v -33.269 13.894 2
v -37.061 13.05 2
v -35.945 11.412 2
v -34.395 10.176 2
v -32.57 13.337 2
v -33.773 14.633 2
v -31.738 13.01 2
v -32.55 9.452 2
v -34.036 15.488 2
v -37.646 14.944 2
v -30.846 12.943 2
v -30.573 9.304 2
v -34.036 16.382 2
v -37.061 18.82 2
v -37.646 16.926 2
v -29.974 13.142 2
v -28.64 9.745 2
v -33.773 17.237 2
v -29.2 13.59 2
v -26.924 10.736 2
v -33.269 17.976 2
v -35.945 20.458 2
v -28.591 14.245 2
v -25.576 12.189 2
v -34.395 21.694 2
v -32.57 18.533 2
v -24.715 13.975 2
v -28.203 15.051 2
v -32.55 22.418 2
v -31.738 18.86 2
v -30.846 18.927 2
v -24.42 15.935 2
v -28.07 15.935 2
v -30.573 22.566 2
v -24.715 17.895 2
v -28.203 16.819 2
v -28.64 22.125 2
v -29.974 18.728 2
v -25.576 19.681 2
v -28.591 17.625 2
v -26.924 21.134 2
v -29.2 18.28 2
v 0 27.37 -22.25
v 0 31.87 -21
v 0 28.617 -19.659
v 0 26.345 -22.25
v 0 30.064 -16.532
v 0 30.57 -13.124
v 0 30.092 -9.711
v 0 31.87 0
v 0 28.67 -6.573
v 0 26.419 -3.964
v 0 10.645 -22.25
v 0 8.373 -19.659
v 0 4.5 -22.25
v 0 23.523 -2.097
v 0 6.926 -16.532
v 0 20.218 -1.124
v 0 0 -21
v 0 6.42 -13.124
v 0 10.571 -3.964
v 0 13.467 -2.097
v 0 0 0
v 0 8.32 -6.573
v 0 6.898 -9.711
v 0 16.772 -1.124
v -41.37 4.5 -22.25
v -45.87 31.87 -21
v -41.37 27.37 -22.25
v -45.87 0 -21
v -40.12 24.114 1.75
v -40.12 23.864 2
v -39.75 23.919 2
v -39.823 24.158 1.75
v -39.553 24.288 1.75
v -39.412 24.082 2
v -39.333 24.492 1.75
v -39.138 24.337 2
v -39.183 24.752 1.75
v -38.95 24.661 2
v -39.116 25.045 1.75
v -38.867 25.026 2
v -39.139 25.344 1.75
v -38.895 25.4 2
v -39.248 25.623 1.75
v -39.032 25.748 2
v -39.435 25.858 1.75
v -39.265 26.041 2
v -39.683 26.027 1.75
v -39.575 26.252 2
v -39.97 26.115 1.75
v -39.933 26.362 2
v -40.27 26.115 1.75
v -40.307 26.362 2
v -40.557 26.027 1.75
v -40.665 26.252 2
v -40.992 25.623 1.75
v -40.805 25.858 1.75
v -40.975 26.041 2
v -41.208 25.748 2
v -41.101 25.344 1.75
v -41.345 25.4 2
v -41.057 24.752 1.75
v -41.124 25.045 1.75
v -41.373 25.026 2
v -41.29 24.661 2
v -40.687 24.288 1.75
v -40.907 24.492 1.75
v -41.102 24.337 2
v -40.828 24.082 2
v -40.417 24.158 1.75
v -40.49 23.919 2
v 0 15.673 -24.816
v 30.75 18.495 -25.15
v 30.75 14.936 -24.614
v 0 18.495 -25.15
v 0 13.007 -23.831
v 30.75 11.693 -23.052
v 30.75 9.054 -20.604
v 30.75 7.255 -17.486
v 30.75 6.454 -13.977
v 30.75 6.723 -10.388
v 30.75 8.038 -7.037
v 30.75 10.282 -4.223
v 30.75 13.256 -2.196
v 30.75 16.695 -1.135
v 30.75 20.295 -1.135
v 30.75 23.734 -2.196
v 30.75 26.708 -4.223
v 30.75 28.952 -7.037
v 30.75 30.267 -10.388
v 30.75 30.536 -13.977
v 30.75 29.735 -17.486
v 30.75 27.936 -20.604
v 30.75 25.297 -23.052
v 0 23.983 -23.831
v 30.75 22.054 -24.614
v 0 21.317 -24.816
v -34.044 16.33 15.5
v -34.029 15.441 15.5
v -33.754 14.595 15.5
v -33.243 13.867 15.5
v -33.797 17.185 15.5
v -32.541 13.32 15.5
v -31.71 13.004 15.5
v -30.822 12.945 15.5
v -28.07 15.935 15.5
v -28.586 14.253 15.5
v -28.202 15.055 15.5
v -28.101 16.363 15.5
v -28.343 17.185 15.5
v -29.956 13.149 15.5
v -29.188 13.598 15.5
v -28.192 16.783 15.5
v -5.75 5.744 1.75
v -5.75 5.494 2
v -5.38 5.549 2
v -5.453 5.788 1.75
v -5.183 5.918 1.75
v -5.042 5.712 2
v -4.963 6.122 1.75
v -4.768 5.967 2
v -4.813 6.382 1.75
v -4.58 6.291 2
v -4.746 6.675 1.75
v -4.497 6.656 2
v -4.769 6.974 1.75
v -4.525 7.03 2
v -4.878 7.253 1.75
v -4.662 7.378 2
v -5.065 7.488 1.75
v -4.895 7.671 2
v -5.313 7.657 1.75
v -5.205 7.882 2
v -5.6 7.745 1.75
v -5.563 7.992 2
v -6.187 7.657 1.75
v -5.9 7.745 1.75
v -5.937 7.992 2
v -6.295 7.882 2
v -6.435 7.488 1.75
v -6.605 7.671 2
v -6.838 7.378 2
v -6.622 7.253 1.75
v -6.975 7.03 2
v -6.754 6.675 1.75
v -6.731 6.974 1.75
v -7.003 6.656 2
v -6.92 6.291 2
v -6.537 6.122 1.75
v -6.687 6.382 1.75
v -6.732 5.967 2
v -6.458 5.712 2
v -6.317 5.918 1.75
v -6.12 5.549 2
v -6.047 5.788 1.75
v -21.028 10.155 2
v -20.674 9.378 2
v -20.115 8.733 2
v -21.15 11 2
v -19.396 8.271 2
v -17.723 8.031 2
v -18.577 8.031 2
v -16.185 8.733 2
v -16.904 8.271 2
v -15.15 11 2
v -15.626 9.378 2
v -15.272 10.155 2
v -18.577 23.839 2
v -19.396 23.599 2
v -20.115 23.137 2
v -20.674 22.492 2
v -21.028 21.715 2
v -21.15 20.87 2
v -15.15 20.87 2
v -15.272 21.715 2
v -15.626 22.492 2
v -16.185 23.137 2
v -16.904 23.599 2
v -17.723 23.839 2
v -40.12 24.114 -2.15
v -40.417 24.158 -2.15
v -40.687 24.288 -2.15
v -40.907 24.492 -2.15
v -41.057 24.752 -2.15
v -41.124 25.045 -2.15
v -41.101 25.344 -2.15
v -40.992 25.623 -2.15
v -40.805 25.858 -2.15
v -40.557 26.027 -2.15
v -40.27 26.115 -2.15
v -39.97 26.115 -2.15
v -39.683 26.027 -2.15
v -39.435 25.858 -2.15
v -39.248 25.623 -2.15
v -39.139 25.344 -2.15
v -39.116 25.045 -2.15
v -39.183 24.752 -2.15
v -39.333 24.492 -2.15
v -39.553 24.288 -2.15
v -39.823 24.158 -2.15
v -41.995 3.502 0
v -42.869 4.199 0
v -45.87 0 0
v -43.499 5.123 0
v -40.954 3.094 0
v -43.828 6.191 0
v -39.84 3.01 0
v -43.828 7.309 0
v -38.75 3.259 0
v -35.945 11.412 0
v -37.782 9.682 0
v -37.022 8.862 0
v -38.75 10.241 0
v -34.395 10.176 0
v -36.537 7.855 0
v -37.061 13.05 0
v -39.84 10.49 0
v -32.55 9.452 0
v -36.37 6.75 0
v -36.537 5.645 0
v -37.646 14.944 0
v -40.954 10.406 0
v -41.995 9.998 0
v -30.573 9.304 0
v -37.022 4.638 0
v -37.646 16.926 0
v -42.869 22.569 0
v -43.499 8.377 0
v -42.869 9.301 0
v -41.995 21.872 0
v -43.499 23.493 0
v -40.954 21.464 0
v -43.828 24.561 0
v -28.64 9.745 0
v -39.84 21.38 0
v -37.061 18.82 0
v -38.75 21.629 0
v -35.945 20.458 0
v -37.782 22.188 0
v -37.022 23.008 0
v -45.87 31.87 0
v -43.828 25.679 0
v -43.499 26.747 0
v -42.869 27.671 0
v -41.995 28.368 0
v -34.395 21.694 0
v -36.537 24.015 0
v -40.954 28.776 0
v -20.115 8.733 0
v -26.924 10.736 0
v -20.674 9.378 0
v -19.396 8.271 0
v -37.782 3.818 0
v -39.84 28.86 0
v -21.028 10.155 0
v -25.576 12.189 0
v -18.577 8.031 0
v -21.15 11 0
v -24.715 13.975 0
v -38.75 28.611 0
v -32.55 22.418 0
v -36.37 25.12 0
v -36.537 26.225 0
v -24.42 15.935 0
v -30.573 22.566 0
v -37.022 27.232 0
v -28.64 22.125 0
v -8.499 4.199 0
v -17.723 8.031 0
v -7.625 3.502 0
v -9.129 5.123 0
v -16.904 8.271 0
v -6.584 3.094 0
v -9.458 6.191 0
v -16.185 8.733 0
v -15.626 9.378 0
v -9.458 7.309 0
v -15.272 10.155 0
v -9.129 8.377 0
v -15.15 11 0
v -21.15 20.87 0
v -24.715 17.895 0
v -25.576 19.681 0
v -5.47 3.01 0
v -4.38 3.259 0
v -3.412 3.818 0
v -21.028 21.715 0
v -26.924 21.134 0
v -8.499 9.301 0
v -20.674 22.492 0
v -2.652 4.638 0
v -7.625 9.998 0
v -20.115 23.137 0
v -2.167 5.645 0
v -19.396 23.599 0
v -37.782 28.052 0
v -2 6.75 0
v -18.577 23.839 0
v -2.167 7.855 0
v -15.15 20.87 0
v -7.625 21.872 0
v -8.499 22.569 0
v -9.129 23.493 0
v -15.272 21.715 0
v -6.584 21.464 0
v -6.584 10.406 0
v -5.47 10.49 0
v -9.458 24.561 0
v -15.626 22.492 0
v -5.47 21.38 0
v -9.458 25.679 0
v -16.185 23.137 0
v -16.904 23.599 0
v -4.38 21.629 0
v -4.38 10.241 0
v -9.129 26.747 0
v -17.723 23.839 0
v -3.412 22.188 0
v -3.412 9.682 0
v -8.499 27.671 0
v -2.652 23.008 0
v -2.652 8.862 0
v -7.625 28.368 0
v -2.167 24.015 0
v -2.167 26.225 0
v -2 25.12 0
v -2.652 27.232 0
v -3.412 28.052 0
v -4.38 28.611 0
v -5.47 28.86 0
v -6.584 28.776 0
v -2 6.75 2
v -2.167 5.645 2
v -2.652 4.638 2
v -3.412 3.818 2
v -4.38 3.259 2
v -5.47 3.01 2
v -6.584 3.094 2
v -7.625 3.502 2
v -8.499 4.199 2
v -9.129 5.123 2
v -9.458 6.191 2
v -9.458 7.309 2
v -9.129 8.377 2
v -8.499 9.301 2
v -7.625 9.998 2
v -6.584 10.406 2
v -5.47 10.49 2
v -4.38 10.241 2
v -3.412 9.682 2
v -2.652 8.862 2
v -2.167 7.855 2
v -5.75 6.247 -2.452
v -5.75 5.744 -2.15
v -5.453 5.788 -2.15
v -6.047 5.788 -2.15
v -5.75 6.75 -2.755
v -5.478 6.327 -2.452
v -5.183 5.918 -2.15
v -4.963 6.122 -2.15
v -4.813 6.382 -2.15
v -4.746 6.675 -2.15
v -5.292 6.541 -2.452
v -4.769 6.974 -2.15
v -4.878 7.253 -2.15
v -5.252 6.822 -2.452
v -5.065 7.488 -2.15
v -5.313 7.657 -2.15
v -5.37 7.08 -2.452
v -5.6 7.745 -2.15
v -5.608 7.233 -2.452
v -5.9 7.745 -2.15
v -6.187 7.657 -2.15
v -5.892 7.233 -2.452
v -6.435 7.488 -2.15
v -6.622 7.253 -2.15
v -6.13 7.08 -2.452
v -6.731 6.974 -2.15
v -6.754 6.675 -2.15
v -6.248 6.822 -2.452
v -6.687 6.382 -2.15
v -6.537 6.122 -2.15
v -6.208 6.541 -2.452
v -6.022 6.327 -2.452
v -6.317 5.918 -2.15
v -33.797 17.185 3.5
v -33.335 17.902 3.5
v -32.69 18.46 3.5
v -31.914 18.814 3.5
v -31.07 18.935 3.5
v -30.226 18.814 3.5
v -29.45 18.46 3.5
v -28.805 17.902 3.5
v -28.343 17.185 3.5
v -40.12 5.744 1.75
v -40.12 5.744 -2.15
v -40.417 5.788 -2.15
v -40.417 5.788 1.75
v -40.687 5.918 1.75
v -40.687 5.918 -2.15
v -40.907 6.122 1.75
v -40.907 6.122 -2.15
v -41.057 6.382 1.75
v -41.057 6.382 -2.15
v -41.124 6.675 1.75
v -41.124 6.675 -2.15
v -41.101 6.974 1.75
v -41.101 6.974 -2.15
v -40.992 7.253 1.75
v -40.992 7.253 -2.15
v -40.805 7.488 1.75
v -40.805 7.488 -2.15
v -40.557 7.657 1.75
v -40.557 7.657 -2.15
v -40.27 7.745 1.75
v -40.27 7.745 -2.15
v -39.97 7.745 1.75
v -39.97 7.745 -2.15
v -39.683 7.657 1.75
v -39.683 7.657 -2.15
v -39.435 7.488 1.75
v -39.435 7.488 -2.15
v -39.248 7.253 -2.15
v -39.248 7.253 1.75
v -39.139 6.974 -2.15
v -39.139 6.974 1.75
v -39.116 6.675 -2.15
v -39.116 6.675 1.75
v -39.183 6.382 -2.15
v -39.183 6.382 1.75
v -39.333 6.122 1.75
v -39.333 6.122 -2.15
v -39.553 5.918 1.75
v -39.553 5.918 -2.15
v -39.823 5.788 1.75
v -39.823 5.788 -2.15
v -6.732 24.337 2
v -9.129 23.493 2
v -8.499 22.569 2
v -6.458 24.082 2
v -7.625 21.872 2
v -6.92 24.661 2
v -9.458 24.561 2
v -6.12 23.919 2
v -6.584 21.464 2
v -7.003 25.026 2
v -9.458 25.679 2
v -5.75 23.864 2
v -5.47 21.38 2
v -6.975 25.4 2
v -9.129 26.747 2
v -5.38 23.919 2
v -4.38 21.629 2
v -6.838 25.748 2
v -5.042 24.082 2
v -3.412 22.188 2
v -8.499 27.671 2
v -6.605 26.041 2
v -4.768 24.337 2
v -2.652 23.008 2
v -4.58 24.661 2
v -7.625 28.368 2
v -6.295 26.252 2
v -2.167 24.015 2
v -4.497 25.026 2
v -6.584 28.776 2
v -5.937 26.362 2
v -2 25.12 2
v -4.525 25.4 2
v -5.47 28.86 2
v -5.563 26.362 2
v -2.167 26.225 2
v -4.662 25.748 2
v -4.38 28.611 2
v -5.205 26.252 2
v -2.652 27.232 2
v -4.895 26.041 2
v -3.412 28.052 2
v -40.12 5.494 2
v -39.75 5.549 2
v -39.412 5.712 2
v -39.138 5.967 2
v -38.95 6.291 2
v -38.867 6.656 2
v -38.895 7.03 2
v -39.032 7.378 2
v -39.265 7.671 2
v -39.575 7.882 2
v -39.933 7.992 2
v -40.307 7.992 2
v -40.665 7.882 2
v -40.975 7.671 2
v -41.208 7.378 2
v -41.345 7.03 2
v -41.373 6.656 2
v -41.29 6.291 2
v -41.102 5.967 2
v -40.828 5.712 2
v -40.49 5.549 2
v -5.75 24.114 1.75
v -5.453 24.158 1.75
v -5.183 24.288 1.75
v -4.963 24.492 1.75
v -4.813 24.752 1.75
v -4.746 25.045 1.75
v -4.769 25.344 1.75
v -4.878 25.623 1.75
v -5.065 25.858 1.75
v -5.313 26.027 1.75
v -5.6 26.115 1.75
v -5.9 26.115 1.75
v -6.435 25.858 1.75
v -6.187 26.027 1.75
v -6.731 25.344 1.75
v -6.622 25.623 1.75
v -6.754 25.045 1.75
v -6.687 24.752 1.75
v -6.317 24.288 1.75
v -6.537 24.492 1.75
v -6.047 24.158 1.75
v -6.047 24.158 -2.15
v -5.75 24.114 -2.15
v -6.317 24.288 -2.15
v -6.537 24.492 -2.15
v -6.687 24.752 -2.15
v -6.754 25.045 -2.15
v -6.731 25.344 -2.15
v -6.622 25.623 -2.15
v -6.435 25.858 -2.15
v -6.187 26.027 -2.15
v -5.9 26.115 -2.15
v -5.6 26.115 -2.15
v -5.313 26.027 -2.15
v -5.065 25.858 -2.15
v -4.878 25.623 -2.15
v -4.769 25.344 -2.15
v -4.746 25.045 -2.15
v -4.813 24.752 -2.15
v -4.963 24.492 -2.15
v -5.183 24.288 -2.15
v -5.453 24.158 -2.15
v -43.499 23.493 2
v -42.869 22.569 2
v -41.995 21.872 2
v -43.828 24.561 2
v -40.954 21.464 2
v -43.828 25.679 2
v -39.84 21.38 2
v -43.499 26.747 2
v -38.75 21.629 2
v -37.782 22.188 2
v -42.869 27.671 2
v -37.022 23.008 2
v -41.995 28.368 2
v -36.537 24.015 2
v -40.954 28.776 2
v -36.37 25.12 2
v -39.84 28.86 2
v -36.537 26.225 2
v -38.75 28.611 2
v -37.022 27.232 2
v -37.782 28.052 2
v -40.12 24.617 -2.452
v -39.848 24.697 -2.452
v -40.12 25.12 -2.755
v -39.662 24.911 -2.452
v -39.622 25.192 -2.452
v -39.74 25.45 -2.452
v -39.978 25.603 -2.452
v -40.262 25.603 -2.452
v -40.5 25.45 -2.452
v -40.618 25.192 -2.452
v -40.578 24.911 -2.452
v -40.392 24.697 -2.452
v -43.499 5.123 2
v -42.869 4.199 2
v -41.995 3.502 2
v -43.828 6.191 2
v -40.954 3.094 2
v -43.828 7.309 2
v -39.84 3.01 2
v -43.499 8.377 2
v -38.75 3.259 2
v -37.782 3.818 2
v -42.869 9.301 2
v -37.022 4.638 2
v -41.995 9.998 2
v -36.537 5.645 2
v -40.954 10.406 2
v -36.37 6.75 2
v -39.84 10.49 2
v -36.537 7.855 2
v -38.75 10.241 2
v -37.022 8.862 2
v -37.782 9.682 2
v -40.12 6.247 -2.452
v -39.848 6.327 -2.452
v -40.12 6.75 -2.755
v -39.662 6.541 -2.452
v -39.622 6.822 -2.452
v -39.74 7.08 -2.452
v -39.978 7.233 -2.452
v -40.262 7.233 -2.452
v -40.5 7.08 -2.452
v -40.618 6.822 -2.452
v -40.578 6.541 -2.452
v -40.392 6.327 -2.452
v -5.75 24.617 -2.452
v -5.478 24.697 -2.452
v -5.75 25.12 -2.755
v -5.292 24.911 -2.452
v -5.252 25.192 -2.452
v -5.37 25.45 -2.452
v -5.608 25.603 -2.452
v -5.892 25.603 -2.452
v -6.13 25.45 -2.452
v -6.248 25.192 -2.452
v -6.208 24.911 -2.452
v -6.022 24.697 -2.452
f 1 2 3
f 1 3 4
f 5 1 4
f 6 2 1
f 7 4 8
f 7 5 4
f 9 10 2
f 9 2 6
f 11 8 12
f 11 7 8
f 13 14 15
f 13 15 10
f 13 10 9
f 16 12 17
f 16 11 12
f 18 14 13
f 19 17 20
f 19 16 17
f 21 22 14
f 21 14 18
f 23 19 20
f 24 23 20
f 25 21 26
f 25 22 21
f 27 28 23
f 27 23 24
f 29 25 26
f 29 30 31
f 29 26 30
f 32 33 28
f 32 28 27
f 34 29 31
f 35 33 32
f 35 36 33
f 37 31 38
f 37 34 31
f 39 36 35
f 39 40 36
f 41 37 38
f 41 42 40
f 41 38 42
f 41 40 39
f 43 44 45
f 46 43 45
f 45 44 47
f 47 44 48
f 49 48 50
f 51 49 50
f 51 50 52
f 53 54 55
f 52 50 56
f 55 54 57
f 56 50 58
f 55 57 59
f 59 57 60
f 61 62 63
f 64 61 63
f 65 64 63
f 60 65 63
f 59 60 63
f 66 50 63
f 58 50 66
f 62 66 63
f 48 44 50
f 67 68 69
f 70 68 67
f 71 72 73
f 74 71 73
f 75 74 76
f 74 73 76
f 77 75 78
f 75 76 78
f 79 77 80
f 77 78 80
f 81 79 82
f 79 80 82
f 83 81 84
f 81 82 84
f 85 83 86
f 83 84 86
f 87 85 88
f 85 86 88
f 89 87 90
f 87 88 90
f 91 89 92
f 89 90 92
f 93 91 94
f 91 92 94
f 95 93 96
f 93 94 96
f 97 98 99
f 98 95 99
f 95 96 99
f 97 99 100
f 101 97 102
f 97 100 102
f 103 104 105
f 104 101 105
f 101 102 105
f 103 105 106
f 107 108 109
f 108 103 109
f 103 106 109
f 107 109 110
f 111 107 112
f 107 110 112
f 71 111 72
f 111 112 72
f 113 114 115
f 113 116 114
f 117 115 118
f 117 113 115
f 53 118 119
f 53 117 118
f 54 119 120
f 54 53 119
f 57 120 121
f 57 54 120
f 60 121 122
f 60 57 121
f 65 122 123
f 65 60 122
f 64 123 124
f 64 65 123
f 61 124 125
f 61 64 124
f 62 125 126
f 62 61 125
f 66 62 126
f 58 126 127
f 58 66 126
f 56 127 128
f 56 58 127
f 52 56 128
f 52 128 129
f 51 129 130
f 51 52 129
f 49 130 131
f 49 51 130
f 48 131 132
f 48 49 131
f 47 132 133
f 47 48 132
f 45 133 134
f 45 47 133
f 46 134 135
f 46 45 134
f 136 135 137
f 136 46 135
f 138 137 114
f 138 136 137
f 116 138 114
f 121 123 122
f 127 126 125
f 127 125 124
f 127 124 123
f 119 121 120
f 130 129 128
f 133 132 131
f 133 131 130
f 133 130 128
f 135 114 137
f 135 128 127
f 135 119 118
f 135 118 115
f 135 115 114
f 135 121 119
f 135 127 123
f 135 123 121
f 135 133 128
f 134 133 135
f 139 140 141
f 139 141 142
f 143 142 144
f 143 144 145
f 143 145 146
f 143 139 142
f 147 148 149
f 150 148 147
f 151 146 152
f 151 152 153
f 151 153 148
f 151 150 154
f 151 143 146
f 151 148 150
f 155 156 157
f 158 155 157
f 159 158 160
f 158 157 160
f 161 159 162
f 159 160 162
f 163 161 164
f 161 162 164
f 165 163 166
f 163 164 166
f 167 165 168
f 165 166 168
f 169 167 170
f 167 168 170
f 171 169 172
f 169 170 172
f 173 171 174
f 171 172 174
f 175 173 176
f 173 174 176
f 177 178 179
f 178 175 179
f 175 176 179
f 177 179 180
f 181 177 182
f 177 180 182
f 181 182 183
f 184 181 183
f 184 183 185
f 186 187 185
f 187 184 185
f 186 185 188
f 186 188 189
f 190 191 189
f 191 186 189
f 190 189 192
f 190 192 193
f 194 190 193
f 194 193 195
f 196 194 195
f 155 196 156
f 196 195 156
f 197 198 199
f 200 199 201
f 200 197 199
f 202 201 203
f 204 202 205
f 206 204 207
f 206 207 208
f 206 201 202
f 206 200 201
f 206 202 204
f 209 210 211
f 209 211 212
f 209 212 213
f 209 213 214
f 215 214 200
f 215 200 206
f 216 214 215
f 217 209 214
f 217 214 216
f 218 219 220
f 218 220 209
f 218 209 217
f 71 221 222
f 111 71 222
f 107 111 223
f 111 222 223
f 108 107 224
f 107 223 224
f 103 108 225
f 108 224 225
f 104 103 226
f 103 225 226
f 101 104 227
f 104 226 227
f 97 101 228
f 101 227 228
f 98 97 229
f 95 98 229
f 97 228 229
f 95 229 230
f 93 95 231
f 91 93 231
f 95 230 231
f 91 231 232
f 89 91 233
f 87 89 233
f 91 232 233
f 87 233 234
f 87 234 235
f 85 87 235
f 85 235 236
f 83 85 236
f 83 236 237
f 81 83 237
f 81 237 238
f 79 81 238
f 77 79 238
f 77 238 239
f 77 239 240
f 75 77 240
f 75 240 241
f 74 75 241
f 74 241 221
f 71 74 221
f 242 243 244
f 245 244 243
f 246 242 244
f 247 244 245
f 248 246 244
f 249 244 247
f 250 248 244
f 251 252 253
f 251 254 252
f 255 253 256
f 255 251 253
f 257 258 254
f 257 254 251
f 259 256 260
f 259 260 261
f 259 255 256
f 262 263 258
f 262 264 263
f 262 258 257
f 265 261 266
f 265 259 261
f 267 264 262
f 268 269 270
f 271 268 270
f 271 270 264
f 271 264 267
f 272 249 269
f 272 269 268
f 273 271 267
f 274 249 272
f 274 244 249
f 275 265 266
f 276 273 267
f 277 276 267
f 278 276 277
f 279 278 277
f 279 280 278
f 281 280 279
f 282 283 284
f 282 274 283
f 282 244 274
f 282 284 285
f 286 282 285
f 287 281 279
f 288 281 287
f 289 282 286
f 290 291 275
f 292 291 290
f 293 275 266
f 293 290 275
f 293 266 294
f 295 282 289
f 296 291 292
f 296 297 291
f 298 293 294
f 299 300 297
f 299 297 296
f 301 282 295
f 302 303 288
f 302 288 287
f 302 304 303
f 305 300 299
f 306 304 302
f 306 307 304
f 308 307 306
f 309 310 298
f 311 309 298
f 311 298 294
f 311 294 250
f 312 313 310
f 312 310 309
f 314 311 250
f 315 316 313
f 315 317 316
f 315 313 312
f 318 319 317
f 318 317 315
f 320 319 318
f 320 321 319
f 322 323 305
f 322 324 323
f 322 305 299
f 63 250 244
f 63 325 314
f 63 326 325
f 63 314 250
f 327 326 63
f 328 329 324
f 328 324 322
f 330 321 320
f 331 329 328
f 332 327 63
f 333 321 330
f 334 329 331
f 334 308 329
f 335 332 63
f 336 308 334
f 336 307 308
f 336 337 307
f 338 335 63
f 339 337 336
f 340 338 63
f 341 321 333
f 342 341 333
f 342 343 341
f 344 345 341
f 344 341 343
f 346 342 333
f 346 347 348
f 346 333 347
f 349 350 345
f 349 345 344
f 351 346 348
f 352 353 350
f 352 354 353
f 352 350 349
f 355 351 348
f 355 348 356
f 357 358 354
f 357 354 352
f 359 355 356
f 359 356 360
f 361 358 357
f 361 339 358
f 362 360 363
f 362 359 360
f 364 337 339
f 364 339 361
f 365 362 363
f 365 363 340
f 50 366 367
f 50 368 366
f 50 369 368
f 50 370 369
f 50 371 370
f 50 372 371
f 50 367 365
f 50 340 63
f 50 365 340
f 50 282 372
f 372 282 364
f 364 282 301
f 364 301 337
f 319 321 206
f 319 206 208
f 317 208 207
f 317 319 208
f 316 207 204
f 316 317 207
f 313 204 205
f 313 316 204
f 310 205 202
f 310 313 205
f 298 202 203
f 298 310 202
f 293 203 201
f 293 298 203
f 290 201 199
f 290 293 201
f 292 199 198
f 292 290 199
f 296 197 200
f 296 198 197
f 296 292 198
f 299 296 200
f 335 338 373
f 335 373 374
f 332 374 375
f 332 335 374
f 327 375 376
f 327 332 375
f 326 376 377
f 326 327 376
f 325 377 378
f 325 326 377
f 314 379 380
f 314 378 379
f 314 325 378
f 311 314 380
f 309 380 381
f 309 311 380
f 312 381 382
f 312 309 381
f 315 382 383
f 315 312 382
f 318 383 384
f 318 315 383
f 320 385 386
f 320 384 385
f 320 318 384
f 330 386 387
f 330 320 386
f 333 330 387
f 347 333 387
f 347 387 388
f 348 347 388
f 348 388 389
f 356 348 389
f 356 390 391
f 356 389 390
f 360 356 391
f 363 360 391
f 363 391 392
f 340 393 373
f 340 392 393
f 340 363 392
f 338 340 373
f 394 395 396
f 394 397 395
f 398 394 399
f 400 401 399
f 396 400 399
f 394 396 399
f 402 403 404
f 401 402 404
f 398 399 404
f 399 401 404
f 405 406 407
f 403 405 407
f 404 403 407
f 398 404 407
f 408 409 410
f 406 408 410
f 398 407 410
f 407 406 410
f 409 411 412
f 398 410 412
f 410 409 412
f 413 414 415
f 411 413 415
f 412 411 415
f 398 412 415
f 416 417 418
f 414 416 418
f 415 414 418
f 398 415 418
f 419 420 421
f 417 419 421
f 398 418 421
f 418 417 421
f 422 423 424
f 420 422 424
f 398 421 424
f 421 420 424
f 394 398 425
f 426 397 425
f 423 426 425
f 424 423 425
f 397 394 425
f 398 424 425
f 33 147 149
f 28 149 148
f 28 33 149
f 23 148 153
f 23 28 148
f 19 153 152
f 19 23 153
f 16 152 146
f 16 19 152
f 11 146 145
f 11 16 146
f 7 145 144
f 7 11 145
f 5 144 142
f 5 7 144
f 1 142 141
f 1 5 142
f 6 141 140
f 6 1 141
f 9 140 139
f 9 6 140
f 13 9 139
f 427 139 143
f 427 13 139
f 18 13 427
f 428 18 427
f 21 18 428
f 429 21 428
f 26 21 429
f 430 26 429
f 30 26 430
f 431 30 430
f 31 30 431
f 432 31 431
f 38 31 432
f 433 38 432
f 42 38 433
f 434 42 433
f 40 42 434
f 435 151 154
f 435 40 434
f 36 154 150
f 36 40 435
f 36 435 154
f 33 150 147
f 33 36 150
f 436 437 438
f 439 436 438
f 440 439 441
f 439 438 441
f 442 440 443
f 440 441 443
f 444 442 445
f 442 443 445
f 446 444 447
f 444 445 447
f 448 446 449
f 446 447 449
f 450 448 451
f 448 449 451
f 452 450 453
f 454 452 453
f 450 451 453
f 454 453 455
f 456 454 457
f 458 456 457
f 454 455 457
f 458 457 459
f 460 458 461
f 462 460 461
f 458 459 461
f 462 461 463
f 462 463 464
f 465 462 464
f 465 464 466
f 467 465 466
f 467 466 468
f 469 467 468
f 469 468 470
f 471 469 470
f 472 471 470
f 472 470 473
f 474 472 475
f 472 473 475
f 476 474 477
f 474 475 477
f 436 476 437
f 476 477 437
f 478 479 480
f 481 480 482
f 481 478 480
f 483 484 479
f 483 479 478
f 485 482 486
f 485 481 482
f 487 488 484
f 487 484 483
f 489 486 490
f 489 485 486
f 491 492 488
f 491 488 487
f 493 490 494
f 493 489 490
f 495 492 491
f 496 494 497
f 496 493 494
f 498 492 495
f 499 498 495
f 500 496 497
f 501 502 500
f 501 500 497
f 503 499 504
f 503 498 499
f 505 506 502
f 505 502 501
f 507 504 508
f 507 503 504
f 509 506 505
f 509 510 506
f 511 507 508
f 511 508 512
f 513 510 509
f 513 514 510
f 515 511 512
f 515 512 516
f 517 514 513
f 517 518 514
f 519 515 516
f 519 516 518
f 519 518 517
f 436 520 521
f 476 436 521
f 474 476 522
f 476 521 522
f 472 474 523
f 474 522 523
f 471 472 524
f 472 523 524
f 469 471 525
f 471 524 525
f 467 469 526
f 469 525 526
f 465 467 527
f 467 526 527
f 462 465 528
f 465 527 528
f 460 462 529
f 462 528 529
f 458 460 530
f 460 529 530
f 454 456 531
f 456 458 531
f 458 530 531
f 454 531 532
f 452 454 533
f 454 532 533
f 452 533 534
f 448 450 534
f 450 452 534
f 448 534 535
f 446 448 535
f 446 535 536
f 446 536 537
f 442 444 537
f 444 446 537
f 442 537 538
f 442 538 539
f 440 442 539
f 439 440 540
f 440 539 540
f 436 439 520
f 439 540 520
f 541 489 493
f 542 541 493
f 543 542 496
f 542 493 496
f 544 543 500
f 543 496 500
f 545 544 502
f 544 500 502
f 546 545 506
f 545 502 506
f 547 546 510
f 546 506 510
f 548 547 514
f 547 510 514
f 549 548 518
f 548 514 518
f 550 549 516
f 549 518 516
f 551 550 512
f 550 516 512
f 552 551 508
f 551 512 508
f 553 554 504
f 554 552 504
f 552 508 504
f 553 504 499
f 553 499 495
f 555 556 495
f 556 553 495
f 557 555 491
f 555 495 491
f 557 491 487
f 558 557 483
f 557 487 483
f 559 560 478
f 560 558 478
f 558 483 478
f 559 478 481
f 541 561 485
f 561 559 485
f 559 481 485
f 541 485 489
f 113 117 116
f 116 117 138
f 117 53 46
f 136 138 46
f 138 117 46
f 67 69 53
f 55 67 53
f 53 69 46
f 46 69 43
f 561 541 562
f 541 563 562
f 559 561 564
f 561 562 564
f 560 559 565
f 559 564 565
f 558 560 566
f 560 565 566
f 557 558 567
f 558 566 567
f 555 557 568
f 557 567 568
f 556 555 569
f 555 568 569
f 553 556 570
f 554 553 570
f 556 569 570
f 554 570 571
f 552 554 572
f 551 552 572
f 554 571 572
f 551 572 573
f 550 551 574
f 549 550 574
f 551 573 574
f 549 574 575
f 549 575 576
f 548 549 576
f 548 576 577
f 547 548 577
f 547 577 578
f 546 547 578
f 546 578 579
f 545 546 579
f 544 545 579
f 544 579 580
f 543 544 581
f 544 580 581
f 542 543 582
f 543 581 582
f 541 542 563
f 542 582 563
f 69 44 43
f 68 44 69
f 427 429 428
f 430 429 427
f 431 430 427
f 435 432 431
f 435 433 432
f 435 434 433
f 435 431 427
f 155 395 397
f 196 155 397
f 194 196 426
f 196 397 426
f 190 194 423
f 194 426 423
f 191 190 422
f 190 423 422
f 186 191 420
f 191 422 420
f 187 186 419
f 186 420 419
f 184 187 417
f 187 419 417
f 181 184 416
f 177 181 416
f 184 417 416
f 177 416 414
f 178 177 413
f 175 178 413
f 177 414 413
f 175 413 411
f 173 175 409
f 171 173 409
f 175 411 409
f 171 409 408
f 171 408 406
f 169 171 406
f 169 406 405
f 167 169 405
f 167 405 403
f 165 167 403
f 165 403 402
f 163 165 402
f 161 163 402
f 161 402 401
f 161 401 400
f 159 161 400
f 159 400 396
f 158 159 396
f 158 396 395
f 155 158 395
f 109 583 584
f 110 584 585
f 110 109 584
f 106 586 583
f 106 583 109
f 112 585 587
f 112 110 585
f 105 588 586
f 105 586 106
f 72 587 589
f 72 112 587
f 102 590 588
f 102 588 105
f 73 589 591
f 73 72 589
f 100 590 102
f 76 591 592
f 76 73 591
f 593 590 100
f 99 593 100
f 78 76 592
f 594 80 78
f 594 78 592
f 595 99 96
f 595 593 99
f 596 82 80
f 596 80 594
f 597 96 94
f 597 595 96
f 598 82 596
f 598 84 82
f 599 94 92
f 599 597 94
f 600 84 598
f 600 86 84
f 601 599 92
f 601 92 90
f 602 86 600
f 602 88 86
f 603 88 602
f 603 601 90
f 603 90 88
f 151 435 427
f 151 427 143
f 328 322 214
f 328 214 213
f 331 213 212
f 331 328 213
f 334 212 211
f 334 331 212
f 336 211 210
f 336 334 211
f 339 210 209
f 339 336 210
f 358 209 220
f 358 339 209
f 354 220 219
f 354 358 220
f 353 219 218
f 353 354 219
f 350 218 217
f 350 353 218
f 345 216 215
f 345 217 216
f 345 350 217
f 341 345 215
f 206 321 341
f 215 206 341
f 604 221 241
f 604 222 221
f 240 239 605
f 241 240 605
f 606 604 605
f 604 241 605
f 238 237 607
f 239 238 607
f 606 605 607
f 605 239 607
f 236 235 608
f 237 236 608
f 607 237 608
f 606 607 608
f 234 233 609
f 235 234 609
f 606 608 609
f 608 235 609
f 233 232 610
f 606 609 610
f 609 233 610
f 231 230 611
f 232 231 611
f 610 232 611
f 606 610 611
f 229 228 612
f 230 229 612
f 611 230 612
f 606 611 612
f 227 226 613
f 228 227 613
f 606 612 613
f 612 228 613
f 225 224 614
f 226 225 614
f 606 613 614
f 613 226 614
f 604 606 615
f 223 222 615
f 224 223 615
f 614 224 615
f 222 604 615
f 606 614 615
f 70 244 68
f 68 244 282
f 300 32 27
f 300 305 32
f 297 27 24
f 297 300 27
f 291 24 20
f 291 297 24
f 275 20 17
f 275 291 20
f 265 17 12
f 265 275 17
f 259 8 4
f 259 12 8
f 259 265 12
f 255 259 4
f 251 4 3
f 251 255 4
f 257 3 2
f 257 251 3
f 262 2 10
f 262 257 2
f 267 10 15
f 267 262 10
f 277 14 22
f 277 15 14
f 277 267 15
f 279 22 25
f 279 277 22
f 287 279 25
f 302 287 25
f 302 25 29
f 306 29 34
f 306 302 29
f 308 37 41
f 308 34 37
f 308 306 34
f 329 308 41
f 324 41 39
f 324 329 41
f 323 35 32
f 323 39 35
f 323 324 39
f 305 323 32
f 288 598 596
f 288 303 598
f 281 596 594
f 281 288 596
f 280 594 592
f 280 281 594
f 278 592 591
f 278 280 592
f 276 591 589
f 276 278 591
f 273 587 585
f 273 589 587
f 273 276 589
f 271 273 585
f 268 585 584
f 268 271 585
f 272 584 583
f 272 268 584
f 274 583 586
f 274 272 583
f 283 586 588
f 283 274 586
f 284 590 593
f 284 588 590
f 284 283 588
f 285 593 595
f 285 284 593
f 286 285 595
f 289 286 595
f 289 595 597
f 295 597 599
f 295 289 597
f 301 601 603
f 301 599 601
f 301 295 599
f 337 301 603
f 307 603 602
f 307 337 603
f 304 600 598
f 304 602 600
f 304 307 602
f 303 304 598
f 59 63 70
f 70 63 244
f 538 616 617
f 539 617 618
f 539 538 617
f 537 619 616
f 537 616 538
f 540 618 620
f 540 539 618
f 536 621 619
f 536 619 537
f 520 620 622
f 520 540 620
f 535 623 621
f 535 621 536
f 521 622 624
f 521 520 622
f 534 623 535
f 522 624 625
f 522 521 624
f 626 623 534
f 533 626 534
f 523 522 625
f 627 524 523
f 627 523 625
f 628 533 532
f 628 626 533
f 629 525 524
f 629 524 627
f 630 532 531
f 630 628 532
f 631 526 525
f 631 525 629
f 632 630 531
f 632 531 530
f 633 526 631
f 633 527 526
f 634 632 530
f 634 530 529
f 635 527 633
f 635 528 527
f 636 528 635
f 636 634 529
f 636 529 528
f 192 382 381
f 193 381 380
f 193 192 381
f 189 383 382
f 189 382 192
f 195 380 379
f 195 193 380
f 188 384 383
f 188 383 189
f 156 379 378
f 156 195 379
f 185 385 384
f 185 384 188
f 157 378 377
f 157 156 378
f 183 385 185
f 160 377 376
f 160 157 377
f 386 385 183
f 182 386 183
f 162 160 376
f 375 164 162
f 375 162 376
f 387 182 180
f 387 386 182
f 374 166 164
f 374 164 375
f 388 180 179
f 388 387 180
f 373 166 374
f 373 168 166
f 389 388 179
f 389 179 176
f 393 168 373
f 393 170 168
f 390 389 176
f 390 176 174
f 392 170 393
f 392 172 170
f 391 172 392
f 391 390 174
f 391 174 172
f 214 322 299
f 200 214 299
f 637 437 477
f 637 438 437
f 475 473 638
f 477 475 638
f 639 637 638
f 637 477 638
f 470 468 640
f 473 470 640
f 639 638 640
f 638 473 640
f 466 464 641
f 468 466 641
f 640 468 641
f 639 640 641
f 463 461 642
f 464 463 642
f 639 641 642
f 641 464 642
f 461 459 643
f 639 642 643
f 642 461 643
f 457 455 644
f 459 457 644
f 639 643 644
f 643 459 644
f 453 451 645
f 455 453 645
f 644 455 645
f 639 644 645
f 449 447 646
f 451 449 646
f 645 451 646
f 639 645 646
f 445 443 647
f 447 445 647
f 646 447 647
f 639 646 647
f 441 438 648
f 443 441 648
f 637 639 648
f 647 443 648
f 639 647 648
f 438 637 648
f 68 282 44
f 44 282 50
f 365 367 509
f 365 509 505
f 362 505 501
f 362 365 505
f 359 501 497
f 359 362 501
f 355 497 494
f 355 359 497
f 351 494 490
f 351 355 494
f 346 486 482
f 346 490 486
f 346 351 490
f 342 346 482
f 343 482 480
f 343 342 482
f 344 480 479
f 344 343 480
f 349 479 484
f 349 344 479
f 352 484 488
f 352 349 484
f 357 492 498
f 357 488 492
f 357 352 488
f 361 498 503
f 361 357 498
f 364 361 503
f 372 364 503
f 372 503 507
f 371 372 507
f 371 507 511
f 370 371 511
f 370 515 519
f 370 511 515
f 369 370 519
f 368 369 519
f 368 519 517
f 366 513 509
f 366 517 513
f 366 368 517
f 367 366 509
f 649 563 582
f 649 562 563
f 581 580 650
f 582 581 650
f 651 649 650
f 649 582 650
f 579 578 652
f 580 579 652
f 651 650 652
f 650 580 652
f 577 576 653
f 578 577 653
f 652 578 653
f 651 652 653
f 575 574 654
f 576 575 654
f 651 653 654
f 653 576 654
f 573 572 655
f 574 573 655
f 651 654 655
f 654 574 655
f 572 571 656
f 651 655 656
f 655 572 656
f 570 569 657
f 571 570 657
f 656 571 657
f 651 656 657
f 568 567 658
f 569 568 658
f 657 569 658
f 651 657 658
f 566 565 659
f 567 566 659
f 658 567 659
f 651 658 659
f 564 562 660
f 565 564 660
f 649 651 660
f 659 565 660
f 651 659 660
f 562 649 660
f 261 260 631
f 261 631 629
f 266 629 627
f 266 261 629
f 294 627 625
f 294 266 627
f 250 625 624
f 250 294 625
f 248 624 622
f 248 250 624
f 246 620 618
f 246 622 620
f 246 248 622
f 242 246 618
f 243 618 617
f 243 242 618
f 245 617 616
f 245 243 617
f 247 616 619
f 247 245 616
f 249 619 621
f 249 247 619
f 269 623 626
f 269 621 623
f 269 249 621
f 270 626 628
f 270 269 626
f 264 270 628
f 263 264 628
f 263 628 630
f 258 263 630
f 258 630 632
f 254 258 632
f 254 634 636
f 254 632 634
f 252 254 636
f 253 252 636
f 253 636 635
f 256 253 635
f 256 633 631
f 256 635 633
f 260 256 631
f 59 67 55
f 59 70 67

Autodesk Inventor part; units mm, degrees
ref_plane "YZ Plane" through (0, 0, 0) normal (1, 0, 0) x (0, 1, 0)
ref_plane "XZ Plane" through (0, 0, 0) normal (0, 1, 0) x (-1, 0, 0)
sketch "Skizze3" plane through (0, 0, 0) normal (0, 0, 1) x (1, 0, 0)
  line L0 (0, 0) -> (-45.87, 0)
  line L1 (-45.87, 0) -> (-45.87, 31.87)
  line L2 (-45.87, 31.87) -> (0, 31.87)
  line L3 (0, 31.87) -> (0, 0)
  circle A0 centre (-40.12, 25.12) radius 3.75
  line L4 (-6.8112, 15.935) -> (-34.2962, 15.935) construction
  circle A1 centre (-31.07, 15.935) radius 6.65
  circle A2 centre (-31.07, 15.935) radius 3
  circle A3 centre (-40.12, 6.75) radius 3.75
  circle A4 centre (-5.75, 25.12) radius 3.75
  circle A5 centre (-5.75, 6.75) radius 3.75
  line L5 (-18.15, 11) -> (-18.15, 20.87) construction
  line L6 (-15.15, 11) -> (-15.15, 20.87)
  line L7 (-21.15, 20.87) -> (-21.15, 11)
  arc A6 (-21.15, 11) -> (-15.15, 11) centre (-18.15, 11) ccw
  arc A7 (-15.15, 20.87) -> (-21.15, 20.87) centre (-18.15, 20.87) ccw
  point P0 (0, 15.935)
  point P1 (-18.15, 15.935)
  point P2 (-18.15, 23.87)
  point P3 (-18.15, 8)
  dimension "d5" = 6.75
  dimension "d6" = 5.75
  dimension "d7" = 7.5
  dimension "d9" = 45.87
  dimension "d10" = 31.87
  dimension "d11" = 14.8
  dimension "d12" = 13.3
  dimension "d13" = 6
  dimension "d14" = 6.75
  dimension "d15" = 6.75
  dimension "d16" = 6.75
  dimension "d17" = 5.75
  dimension "d18" = 5.75
  dimension "d19" = 5.75
  dimension "d20" = 7.5
  dimension "d21" = 7.5
  dimension "d22" = 7.5
  dimension "d23" = 15.87
  dimension "d24" = 18.15
  dimension "d25" = 6
extrude "Extrusion3" add sketch "Skizze3" against normal blind 22.25 contours L0 L1 L2 L3 | A0 | A1 | A2 | A3 | A4 | A5 | A6 L7 A7 L6
extrude "Extrusion4" add sketch "Skizze3" along normal blind 2 contours A0 | A1 | A3 | A4 | A5 | A6 L7 A7 L6
extrude "Extrusion5" add sketch "Skizze3" along normal blind 15.5 contours A2
sketch "Skizze4" plane through (0, 0, 0) normal (1, 0, 0) x (0, 0, -1)
  line L0 (0, 31.87) -> (22.25, 31.87) projected
  line L1 (0, 0) -> (0, 31.87) projected
  circle A0 centre (13.075, 18.495) radius 12.075
  dimension "d33" = 13.375
  dimension "d34" = 13.075
  dimension "d35" = 24.15
extrude "Extrusion6" add sketch "Skizze4" along normal blind 30.75
sketch "Skizze5" plane through (-5.75, 25.12, 2) normal (0, 0, 1) x (1, 0, 0)
  circle A0 centre (-34.37, 0) radius 3.75 projected
  circle A1 centre (-34.37, -18.37) radius 3.75 projected
  circle A2 centre (0, -18.37) radius 3.75 projected
  circle A3 centre (0, 0) radius 3.75 projected
  circle A4 centre (0, -18.37) radius 3.75 projected
  point P0 (5.75, -25.12)
hole "Bohrung1" at (-5.75, 25.12, 2) at (-5.75, 6.75, 2) at (-40.12, 6.75, 2) at (-40.12, 25.12, 2) direction (0, 0, -1) diameter 2.013 depth 4.15 tip angle 118 thread size "M2.5x0.45" class "6H" standard "ISO Metric profile"
ref_plane "Arbeitsebene1" through (-28.07, 15.935, 0) normal (-1, 0, 0) x (0, 0, 1)
sketch "Skizze6" plane through (-28.07, 15.935, 0) normal (-1, 0, 0) x (0, 0, 1)
  line L0 (15.5, -3) -> (15.5, 3) projected
  line L1 (2, 3) -> (15.5, 3) projected
  line L2 (15.5, 3) -> (3.5, 3)
  line L3 (3.5, 3) -> (3.5, 1.25)
  line L4 (3.5, 1.25) -> (15.5, 1.25)
  line L5 (15.5, 1.25) -> (15.5, 3)
  point P0 (0, -15.935)
  point P1 (3.5, 3)
  point P2 (3.5, 2.125)
  dimension "d49" = 12
  dimension "d50" = 1.75
extrude "Extrusion7" cut sketch "Skizze6" along normal blind 30.75 and the other way blind 15.375
chamfer "Fase1" distance 0.25 angle 45 4 edges at (-40.12, 7.7565, 2) (-5.75, 7.7565, 2) (-40.12, 26.1265, 2) (-5.75, 26.1265, 2)
chamfer "Fase2" distance 4.5 distance2 1.25 3 edges at (-22.935, 31.87, -22.25) (-45.87, 15.935, -22.25) (-22.935, 0, -22.25) measured on face at (-30.58, 14.1716, -22.25)
equation "\"d5\" = schraube_p_x"
equation "\"d6\" = schraube_p_y"
equation "\"d7\" = schraube_d"
equation "\"d9\" = gh_l"
equation "\"d10\" = gh_b"
equation "\"d11\" = s_p_y"
equation "\"d12\" = s_d_u"
equation "\"d13\" = s_d"
equation "\"d14\" = d5"
equation "\"d15\" = d5"
equation "\"d16\" = d5"
equation "\"d17\" = d6"
equation "\"d18\" = d6"
equation "\"d19\" = d6"
equation "\"d20\" = d7"
equation "\"d21\" = d7"
equation "\"d22\" = d7"
equation "\"d23\" = nut_l"
equation "\"d24\" = nut_p_x_neg"
equation "\"d25\" = nut_b"
equation "\"d26\" = gh_h"
equation "\"d28\" = Absatz_h"
equation "\"d30\" = s_h"
equation "\"d33\" = m_p_xn"
equation "\"d34\" = m_p_z_neg"
equation "\"d35\" = M_d"
equation "\"d36\" = M_l"
equation "\"d45\" = M_l"
equation "\"s_h\" = 15.5"
equation "\"schraube_p_x\" = 6.75"
equation "\"s_p_y\" = 14.8"
equation "\"Absatz_h\" = 2"
equation "\"schraube_d\" = 7.5"
equation "\"gh_h\" = 22.25"
equation "\"M_d\" = 24.15"
equation "\"s_d\" = 6"
equation "\"M_l\" = 30.75"
equation "\"schraube_p_y\" = 5.75"
equation "\"s_d_u\" = 13.3"
equation "\"gs_h\" = 37.75"
equation "\"gh_l\" = 45.87"
equation "\"gh_b\" = 31.87"
equation "\"nut_p_x_neg\" = 18.15"
equation "\"nut_l\" = 15.87"
equation "\"nut_b\" = 6"
equation "\"m_p_z_neg\" = 13.075"
equation "\"m_p_xn\" = 13.375"
equation "\"Zet_KluppenDicke\" = 1"
equation "\"St_kurz_Höhe\" = 7.5"
equation "\"Druck_teil_Höhe\" = 7.5"
equation "\"Zet_Höhe\" = 5"
equation "\"Zet_Kluppen_Höhe\" = 7"
equation "\"Gel_Mot_St_1\" = 35"
equation "\"GM_Platte_Höhe\" = 4"
equation "\"SM_Scheibe_Durchmesser\" = 22"
equation "\"SM_Schrauben_Pos_Abstand\" = 31"
equation "\"Gel_Mot_St_Höhe\" = 5"
equation "\"Gel_Mot_St_2\" = 35"
equation "\"Bas_Haupt_Plat_Höhe\" = 4"
properties part number "BT001_trajan20_21"
